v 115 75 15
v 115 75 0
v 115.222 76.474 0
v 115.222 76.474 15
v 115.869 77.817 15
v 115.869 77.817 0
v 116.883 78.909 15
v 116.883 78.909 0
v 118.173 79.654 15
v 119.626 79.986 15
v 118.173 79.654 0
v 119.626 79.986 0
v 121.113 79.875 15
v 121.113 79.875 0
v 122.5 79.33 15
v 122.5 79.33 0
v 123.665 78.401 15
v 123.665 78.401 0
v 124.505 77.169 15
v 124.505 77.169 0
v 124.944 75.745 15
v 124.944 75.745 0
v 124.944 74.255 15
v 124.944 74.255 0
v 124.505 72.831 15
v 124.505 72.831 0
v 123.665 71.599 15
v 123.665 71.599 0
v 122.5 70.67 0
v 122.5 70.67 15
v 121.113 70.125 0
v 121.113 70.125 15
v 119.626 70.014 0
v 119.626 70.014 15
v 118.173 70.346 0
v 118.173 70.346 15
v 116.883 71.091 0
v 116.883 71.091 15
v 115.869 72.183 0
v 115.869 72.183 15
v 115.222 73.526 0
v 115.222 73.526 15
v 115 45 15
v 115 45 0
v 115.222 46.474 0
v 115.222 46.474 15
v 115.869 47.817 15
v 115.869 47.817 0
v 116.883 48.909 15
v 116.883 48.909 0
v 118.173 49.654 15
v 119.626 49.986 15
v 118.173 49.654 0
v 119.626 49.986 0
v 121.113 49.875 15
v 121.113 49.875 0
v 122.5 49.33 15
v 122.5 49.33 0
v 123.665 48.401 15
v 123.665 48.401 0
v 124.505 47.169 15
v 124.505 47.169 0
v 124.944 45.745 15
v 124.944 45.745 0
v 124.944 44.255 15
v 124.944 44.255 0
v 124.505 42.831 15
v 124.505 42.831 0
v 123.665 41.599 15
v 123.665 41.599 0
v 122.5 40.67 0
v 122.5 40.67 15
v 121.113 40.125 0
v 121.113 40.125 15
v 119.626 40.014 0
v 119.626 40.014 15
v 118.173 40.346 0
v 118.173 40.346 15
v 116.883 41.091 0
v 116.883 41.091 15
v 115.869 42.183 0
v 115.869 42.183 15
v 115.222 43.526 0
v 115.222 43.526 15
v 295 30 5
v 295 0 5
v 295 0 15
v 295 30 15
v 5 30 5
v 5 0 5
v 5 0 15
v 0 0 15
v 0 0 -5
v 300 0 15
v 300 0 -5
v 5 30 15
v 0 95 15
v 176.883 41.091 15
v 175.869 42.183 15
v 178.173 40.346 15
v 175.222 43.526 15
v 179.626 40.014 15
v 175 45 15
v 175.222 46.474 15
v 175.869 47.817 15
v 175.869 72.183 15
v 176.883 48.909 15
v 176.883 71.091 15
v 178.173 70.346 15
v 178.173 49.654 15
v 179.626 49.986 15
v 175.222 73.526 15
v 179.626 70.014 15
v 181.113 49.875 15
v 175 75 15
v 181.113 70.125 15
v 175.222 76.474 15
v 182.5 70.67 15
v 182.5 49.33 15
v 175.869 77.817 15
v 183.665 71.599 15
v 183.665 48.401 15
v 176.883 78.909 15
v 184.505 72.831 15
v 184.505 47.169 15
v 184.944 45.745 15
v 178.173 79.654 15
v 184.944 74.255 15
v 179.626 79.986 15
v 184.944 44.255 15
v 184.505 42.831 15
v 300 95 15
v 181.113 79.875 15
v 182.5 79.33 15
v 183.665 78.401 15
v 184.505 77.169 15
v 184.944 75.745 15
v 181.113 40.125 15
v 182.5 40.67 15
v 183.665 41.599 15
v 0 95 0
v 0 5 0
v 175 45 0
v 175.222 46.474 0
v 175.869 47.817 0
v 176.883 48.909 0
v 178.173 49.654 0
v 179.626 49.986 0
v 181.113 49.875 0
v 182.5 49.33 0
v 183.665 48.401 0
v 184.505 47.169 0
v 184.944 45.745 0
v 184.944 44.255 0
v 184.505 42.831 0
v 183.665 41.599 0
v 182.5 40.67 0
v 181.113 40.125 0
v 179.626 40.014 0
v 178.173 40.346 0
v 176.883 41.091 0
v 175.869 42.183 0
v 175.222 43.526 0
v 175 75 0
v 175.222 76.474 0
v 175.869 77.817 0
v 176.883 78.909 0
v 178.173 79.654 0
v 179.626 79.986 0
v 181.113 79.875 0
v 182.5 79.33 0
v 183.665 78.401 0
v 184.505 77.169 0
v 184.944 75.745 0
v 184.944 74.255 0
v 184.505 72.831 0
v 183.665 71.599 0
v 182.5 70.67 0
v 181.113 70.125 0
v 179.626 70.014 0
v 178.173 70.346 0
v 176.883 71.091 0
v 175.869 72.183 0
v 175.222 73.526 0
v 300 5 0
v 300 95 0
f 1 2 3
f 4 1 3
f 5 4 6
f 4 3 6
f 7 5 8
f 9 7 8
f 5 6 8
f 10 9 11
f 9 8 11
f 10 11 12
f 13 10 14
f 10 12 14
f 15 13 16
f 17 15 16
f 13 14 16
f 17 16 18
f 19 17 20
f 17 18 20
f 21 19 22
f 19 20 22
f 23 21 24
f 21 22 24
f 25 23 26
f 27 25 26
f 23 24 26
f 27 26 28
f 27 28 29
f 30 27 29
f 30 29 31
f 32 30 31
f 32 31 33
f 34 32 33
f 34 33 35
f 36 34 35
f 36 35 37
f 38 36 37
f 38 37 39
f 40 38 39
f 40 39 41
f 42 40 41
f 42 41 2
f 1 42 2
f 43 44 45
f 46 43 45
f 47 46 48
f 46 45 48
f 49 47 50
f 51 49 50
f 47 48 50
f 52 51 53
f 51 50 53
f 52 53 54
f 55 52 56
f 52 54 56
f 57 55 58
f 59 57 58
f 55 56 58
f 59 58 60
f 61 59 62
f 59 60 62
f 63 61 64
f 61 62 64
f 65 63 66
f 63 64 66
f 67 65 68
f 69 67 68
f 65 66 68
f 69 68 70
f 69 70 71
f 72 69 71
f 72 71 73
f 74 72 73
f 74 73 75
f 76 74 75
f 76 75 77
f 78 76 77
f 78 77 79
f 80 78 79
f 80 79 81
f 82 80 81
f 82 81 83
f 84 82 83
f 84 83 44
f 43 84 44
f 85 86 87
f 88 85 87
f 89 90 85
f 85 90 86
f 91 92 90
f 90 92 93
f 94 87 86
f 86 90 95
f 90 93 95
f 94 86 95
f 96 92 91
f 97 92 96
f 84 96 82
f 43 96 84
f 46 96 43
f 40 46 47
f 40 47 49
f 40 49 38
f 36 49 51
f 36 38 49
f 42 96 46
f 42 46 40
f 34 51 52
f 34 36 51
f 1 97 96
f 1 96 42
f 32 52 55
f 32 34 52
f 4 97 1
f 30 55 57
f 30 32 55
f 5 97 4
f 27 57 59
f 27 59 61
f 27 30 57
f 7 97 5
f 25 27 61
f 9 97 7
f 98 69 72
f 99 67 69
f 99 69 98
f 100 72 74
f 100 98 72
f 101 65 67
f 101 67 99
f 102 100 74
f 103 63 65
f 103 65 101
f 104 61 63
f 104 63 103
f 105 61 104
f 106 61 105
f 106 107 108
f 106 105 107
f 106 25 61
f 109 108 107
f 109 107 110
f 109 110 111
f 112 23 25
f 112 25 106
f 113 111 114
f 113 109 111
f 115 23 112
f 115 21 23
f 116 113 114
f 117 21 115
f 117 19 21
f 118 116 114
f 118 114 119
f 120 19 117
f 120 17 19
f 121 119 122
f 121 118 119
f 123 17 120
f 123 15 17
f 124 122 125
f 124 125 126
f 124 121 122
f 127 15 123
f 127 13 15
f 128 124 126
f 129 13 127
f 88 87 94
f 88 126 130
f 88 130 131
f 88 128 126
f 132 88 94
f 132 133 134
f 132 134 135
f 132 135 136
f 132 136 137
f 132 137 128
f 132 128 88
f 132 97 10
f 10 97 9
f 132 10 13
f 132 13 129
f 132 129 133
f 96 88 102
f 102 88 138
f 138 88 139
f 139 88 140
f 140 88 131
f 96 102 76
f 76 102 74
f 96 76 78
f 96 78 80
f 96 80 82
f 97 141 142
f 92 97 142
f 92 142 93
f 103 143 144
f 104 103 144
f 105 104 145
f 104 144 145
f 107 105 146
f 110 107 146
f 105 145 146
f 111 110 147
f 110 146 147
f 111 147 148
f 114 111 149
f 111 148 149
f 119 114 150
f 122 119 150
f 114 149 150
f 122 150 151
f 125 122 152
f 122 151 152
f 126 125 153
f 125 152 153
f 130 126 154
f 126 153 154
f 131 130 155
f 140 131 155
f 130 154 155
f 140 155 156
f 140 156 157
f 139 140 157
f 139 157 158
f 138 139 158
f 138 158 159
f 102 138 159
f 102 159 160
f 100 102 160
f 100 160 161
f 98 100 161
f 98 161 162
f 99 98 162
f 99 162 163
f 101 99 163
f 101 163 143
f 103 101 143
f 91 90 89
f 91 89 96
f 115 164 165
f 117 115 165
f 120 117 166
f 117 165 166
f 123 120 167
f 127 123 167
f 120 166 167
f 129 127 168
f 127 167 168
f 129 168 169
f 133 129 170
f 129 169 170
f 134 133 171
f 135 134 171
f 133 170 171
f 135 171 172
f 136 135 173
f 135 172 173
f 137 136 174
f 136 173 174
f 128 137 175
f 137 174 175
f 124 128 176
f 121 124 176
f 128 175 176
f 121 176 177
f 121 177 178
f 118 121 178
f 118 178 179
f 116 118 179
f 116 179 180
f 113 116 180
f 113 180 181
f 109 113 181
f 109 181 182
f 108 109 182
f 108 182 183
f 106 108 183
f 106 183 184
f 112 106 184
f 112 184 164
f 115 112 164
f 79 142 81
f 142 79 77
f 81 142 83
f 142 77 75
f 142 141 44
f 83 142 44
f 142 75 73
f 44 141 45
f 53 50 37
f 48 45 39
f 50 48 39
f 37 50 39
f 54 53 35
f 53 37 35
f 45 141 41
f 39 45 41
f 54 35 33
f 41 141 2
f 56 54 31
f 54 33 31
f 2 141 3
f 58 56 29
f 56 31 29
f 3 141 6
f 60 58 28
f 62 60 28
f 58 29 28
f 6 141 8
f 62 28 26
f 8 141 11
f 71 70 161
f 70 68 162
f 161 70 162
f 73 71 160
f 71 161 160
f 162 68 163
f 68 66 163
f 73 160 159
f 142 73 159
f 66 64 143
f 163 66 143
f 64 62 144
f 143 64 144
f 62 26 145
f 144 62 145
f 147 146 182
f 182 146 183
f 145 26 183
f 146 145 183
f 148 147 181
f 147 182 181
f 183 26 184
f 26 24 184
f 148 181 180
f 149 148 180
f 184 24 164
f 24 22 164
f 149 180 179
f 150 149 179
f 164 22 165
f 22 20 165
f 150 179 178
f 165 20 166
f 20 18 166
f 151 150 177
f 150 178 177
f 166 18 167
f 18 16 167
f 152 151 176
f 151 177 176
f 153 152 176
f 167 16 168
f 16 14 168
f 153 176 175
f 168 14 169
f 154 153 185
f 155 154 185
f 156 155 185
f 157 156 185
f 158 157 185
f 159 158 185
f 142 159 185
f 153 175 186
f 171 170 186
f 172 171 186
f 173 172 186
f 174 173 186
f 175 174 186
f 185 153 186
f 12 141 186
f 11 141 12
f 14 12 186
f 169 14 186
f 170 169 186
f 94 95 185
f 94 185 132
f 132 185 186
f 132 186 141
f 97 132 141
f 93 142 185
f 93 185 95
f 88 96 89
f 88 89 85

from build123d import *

# Parameters (mm, degrees)
ESQUISSE1_W             = 300
ESQUISSE1_H             = 95
BOSS_EXTRU_1_DEPTH      = 5
BOSS_EXTRU_2_DEPTH      = 300
BOSS_EXTRU_3_DEPTH      = 10
ESQUISSE6_R             = 5
ENL_V_MAT_EXTRU_2_DEPTH = 16
ESQUISSE7_W             = 290
ESQUISSE7_H             = 23.020862504
ENL_V_MAT_EXTRU_3_DEPTH = 30


with BuildPart() as part:
    # Esquisse1 → Boss.-Extru.1 (new body)
    with BuildSketch(Plane.XY):
        with Locations((150, 47.5)):
            Rectangle(ESQUISSE1_W, ESQUISSE1_H)
    extrude(amount=BOSS_EXTRU_1_DEPTH)

    # Esquisse3 → Boss.-Extru.2 (add)
    with BuildSketch(Plane.ZY):
        Polygon((-5, 0), (0, 0), (0, 5), align=None)
    extrude(amount=-BOSS_EXTRU_2_DEPTH)

    # Esquisse5 → Boss.-Extru.3 (add)
    with BuildSketch(Plane.XY.offset(5)):
        Polygon((195, 95), (105, 95), (0, 95), (0, 30), (0, 0), (300, 0), (300, 30), (300, 95), align=None)
    extrude(amount=BOSS_EXTRU_3_DEPTH)

    # Esquisse6 → Enlèv. mat.-Extru.2 (cut, through all)
    with BuildSketch(Plane(origin=(0, 0, 0), x_dir=(-1, 0, 0), z_dir=(0, 0, -1))):
        with Locations((-180, 75)):
            Circle(ESQUISSE6_R)
        with Locations((-180, 45)):
            Circle(ESQUISSE6_R)
        with Locations((-120, 45)):
            Circle(ESQUISSE6_R)
        with Locations((-120, 75)):
            Circle(ESQUISSE6_R)
    extrude(amount=-ENL_V_MAT_EXTRU_2_DEPTH, mode=Mode.SUBTRACT)

    # Esquisse7 → Enlèv. mat.-Extru.3 (cut)
    with BuildSketch(Plane.XZ):
        with Locations((150, 16.510431252)):
            Rectangle(ESQUISSE7_W, ESQUISSE7_H)
    extrude(amount=-ENL_V_MAT_EXTRU_3_DEPTH, mode=Mode.SUBTRACT)


solid = part.part
